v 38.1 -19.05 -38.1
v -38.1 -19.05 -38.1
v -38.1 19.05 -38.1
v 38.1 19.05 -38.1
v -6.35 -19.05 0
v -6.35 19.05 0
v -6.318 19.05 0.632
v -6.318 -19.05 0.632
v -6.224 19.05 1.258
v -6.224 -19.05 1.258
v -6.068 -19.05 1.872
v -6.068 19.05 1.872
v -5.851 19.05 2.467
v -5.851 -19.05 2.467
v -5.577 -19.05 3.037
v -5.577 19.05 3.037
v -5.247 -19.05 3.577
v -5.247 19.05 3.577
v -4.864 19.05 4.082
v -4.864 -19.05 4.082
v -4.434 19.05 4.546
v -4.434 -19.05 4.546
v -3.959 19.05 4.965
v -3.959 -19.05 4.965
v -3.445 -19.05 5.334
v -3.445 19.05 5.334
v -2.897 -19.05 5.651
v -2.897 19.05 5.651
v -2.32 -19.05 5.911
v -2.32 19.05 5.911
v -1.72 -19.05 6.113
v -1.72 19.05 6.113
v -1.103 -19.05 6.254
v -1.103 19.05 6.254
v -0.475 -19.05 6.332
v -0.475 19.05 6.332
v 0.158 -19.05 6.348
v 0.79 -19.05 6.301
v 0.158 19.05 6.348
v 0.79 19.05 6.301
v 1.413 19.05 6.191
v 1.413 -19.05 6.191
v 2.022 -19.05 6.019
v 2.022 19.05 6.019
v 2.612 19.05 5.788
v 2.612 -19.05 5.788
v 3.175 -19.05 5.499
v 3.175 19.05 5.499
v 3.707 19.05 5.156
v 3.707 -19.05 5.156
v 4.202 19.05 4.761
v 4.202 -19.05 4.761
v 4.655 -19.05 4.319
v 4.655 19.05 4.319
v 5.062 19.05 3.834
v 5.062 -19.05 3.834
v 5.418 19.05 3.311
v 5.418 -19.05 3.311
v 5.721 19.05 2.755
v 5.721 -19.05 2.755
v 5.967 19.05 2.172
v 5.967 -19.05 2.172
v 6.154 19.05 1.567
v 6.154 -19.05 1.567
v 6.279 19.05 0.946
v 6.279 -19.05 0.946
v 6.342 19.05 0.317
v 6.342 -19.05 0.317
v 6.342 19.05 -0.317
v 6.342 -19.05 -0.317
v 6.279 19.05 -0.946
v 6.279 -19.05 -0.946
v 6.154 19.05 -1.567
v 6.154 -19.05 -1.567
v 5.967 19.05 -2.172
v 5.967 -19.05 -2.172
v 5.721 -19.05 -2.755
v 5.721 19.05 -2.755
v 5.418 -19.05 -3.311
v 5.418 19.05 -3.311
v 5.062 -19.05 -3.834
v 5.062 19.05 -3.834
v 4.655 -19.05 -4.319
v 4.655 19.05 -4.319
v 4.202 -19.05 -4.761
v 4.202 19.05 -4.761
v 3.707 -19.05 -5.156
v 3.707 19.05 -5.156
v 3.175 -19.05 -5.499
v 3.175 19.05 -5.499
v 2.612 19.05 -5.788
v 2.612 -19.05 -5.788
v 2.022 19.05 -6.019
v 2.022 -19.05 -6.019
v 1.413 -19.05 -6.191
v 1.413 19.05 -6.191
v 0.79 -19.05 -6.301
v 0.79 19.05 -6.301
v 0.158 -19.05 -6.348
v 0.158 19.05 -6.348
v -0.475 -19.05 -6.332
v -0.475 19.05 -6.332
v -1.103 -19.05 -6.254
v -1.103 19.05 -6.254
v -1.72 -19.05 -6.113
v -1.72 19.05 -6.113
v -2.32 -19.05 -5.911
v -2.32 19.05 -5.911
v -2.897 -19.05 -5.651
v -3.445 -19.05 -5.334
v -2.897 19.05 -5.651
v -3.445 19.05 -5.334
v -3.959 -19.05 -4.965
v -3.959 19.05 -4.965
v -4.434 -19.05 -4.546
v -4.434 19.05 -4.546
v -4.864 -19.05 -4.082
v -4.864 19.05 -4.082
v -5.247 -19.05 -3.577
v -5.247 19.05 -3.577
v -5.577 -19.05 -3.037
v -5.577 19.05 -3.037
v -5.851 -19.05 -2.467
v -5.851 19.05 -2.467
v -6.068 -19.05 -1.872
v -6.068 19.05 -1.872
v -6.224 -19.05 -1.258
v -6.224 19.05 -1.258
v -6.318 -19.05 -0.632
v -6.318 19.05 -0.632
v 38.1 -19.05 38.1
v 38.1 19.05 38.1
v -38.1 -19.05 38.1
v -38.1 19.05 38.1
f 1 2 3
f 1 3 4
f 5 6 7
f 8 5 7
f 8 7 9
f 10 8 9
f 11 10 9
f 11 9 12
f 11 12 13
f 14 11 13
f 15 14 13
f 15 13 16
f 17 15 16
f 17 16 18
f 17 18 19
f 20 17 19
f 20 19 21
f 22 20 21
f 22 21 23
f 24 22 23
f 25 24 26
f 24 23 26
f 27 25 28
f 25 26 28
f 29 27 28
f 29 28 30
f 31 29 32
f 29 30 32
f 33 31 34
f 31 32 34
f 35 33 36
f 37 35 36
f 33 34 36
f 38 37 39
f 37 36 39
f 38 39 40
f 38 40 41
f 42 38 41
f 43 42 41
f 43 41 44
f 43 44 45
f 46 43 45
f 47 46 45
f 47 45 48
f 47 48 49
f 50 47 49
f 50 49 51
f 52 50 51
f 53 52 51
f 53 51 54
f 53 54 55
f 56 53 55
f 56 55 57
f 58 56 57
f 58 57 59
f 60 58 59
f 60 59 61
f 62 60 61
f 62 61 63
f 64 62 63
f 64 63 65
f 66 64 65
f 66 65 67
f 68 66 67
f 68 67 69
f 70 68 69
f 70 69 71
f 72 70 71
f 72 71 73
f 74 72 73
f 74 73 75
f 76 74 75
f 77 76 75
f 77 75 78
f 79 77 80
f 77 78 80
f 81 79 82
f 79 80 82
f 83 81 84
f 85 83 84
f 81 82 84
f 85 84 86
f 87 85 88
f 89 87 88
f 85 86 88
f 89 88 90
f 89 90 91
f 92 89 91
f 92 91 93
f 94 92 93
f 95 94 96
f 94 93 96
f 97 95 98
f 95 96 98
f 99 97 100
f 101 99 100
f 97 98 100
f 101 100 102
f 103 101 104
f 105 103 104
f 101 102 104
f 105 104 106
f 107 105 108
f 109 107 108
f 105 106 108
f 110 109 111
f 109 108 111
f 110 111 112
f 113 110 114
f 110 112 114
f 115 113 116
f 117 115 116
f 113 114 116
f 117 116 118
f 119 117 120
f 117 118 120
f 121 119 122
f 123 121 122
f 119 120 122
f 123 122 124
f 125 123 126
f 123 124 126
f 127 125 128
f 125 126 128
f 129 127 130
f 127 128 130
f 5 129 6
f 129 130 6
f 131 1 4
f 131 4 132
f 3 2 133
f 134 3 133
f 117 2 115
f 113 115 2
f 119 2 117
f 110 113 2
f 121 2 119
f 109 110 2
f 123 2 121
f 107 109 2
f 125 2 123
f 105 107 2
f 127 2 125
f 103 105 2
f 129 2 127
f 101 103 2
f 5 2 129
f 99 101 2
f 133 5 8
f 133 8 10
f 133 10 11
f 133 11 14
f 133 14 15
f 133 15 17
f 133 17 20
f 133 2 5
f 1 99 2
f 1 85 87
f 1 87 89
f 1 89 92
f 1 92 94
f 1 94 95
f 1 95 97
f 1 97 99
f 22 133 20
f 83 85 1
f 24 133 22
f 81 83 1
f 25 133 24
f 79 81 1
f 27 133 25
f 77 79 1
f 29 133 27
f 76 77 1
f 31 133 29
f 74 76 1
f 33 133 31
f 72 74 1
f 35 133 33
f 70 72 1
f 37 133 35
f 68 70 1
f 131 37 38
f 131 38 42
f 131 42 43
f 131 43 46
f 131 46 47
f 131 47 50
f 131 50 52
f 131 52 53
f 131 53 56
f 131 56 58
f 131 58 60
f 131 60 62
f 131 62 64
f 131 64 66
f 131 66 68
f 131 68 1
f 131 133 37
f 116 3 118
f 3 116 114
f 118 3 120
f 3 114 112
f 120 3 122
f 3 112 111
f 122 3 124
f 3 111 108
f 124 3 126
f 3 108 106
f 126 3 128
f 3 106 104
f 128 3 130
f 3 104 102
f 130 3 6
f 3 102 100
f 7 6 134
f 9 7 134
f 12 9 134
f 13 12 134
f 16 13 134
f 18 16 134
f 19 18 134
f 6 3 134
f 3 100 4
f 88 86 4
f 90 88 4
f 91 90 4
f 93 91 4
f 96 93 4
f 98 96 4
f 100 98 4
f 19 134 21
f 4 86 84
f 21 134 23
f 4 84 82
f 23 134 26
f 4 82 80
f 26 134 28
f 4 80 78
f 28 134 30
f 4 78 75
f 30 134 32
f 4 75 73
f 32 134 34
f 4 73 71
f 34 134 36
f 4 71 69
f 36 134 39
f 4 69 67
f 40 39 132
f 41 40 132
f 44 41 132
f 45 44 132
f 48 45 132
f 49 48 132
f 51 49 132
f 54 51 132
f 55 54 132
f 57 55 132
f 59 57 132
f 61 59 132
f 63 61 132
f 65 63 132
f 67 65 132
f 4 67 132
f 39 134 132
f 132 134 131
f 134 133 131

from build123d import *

# Parameters (mm, degrees)
F0_W     = 76.2
F0_H     = 76.2
F1_DEPTH = 19.05
F4_D     = 12.7
F4_DEPTH = 609.6


with BuildPart() as f1:
    # F0 (on Front) → F1 (new body, symmetric)
    with BuildSketch(Plane.XZ):
        Rectangle(F0_W, F0_H)
    extrude(amount=F1_DEPTH, both=True)

    # F4
    with Locations(Plane.XZ.offset(25.38984)):
        with Locations((0, 0)):
            Hole(F4_D / 2, depth=F4_DEPTH)


solid = f1.part
